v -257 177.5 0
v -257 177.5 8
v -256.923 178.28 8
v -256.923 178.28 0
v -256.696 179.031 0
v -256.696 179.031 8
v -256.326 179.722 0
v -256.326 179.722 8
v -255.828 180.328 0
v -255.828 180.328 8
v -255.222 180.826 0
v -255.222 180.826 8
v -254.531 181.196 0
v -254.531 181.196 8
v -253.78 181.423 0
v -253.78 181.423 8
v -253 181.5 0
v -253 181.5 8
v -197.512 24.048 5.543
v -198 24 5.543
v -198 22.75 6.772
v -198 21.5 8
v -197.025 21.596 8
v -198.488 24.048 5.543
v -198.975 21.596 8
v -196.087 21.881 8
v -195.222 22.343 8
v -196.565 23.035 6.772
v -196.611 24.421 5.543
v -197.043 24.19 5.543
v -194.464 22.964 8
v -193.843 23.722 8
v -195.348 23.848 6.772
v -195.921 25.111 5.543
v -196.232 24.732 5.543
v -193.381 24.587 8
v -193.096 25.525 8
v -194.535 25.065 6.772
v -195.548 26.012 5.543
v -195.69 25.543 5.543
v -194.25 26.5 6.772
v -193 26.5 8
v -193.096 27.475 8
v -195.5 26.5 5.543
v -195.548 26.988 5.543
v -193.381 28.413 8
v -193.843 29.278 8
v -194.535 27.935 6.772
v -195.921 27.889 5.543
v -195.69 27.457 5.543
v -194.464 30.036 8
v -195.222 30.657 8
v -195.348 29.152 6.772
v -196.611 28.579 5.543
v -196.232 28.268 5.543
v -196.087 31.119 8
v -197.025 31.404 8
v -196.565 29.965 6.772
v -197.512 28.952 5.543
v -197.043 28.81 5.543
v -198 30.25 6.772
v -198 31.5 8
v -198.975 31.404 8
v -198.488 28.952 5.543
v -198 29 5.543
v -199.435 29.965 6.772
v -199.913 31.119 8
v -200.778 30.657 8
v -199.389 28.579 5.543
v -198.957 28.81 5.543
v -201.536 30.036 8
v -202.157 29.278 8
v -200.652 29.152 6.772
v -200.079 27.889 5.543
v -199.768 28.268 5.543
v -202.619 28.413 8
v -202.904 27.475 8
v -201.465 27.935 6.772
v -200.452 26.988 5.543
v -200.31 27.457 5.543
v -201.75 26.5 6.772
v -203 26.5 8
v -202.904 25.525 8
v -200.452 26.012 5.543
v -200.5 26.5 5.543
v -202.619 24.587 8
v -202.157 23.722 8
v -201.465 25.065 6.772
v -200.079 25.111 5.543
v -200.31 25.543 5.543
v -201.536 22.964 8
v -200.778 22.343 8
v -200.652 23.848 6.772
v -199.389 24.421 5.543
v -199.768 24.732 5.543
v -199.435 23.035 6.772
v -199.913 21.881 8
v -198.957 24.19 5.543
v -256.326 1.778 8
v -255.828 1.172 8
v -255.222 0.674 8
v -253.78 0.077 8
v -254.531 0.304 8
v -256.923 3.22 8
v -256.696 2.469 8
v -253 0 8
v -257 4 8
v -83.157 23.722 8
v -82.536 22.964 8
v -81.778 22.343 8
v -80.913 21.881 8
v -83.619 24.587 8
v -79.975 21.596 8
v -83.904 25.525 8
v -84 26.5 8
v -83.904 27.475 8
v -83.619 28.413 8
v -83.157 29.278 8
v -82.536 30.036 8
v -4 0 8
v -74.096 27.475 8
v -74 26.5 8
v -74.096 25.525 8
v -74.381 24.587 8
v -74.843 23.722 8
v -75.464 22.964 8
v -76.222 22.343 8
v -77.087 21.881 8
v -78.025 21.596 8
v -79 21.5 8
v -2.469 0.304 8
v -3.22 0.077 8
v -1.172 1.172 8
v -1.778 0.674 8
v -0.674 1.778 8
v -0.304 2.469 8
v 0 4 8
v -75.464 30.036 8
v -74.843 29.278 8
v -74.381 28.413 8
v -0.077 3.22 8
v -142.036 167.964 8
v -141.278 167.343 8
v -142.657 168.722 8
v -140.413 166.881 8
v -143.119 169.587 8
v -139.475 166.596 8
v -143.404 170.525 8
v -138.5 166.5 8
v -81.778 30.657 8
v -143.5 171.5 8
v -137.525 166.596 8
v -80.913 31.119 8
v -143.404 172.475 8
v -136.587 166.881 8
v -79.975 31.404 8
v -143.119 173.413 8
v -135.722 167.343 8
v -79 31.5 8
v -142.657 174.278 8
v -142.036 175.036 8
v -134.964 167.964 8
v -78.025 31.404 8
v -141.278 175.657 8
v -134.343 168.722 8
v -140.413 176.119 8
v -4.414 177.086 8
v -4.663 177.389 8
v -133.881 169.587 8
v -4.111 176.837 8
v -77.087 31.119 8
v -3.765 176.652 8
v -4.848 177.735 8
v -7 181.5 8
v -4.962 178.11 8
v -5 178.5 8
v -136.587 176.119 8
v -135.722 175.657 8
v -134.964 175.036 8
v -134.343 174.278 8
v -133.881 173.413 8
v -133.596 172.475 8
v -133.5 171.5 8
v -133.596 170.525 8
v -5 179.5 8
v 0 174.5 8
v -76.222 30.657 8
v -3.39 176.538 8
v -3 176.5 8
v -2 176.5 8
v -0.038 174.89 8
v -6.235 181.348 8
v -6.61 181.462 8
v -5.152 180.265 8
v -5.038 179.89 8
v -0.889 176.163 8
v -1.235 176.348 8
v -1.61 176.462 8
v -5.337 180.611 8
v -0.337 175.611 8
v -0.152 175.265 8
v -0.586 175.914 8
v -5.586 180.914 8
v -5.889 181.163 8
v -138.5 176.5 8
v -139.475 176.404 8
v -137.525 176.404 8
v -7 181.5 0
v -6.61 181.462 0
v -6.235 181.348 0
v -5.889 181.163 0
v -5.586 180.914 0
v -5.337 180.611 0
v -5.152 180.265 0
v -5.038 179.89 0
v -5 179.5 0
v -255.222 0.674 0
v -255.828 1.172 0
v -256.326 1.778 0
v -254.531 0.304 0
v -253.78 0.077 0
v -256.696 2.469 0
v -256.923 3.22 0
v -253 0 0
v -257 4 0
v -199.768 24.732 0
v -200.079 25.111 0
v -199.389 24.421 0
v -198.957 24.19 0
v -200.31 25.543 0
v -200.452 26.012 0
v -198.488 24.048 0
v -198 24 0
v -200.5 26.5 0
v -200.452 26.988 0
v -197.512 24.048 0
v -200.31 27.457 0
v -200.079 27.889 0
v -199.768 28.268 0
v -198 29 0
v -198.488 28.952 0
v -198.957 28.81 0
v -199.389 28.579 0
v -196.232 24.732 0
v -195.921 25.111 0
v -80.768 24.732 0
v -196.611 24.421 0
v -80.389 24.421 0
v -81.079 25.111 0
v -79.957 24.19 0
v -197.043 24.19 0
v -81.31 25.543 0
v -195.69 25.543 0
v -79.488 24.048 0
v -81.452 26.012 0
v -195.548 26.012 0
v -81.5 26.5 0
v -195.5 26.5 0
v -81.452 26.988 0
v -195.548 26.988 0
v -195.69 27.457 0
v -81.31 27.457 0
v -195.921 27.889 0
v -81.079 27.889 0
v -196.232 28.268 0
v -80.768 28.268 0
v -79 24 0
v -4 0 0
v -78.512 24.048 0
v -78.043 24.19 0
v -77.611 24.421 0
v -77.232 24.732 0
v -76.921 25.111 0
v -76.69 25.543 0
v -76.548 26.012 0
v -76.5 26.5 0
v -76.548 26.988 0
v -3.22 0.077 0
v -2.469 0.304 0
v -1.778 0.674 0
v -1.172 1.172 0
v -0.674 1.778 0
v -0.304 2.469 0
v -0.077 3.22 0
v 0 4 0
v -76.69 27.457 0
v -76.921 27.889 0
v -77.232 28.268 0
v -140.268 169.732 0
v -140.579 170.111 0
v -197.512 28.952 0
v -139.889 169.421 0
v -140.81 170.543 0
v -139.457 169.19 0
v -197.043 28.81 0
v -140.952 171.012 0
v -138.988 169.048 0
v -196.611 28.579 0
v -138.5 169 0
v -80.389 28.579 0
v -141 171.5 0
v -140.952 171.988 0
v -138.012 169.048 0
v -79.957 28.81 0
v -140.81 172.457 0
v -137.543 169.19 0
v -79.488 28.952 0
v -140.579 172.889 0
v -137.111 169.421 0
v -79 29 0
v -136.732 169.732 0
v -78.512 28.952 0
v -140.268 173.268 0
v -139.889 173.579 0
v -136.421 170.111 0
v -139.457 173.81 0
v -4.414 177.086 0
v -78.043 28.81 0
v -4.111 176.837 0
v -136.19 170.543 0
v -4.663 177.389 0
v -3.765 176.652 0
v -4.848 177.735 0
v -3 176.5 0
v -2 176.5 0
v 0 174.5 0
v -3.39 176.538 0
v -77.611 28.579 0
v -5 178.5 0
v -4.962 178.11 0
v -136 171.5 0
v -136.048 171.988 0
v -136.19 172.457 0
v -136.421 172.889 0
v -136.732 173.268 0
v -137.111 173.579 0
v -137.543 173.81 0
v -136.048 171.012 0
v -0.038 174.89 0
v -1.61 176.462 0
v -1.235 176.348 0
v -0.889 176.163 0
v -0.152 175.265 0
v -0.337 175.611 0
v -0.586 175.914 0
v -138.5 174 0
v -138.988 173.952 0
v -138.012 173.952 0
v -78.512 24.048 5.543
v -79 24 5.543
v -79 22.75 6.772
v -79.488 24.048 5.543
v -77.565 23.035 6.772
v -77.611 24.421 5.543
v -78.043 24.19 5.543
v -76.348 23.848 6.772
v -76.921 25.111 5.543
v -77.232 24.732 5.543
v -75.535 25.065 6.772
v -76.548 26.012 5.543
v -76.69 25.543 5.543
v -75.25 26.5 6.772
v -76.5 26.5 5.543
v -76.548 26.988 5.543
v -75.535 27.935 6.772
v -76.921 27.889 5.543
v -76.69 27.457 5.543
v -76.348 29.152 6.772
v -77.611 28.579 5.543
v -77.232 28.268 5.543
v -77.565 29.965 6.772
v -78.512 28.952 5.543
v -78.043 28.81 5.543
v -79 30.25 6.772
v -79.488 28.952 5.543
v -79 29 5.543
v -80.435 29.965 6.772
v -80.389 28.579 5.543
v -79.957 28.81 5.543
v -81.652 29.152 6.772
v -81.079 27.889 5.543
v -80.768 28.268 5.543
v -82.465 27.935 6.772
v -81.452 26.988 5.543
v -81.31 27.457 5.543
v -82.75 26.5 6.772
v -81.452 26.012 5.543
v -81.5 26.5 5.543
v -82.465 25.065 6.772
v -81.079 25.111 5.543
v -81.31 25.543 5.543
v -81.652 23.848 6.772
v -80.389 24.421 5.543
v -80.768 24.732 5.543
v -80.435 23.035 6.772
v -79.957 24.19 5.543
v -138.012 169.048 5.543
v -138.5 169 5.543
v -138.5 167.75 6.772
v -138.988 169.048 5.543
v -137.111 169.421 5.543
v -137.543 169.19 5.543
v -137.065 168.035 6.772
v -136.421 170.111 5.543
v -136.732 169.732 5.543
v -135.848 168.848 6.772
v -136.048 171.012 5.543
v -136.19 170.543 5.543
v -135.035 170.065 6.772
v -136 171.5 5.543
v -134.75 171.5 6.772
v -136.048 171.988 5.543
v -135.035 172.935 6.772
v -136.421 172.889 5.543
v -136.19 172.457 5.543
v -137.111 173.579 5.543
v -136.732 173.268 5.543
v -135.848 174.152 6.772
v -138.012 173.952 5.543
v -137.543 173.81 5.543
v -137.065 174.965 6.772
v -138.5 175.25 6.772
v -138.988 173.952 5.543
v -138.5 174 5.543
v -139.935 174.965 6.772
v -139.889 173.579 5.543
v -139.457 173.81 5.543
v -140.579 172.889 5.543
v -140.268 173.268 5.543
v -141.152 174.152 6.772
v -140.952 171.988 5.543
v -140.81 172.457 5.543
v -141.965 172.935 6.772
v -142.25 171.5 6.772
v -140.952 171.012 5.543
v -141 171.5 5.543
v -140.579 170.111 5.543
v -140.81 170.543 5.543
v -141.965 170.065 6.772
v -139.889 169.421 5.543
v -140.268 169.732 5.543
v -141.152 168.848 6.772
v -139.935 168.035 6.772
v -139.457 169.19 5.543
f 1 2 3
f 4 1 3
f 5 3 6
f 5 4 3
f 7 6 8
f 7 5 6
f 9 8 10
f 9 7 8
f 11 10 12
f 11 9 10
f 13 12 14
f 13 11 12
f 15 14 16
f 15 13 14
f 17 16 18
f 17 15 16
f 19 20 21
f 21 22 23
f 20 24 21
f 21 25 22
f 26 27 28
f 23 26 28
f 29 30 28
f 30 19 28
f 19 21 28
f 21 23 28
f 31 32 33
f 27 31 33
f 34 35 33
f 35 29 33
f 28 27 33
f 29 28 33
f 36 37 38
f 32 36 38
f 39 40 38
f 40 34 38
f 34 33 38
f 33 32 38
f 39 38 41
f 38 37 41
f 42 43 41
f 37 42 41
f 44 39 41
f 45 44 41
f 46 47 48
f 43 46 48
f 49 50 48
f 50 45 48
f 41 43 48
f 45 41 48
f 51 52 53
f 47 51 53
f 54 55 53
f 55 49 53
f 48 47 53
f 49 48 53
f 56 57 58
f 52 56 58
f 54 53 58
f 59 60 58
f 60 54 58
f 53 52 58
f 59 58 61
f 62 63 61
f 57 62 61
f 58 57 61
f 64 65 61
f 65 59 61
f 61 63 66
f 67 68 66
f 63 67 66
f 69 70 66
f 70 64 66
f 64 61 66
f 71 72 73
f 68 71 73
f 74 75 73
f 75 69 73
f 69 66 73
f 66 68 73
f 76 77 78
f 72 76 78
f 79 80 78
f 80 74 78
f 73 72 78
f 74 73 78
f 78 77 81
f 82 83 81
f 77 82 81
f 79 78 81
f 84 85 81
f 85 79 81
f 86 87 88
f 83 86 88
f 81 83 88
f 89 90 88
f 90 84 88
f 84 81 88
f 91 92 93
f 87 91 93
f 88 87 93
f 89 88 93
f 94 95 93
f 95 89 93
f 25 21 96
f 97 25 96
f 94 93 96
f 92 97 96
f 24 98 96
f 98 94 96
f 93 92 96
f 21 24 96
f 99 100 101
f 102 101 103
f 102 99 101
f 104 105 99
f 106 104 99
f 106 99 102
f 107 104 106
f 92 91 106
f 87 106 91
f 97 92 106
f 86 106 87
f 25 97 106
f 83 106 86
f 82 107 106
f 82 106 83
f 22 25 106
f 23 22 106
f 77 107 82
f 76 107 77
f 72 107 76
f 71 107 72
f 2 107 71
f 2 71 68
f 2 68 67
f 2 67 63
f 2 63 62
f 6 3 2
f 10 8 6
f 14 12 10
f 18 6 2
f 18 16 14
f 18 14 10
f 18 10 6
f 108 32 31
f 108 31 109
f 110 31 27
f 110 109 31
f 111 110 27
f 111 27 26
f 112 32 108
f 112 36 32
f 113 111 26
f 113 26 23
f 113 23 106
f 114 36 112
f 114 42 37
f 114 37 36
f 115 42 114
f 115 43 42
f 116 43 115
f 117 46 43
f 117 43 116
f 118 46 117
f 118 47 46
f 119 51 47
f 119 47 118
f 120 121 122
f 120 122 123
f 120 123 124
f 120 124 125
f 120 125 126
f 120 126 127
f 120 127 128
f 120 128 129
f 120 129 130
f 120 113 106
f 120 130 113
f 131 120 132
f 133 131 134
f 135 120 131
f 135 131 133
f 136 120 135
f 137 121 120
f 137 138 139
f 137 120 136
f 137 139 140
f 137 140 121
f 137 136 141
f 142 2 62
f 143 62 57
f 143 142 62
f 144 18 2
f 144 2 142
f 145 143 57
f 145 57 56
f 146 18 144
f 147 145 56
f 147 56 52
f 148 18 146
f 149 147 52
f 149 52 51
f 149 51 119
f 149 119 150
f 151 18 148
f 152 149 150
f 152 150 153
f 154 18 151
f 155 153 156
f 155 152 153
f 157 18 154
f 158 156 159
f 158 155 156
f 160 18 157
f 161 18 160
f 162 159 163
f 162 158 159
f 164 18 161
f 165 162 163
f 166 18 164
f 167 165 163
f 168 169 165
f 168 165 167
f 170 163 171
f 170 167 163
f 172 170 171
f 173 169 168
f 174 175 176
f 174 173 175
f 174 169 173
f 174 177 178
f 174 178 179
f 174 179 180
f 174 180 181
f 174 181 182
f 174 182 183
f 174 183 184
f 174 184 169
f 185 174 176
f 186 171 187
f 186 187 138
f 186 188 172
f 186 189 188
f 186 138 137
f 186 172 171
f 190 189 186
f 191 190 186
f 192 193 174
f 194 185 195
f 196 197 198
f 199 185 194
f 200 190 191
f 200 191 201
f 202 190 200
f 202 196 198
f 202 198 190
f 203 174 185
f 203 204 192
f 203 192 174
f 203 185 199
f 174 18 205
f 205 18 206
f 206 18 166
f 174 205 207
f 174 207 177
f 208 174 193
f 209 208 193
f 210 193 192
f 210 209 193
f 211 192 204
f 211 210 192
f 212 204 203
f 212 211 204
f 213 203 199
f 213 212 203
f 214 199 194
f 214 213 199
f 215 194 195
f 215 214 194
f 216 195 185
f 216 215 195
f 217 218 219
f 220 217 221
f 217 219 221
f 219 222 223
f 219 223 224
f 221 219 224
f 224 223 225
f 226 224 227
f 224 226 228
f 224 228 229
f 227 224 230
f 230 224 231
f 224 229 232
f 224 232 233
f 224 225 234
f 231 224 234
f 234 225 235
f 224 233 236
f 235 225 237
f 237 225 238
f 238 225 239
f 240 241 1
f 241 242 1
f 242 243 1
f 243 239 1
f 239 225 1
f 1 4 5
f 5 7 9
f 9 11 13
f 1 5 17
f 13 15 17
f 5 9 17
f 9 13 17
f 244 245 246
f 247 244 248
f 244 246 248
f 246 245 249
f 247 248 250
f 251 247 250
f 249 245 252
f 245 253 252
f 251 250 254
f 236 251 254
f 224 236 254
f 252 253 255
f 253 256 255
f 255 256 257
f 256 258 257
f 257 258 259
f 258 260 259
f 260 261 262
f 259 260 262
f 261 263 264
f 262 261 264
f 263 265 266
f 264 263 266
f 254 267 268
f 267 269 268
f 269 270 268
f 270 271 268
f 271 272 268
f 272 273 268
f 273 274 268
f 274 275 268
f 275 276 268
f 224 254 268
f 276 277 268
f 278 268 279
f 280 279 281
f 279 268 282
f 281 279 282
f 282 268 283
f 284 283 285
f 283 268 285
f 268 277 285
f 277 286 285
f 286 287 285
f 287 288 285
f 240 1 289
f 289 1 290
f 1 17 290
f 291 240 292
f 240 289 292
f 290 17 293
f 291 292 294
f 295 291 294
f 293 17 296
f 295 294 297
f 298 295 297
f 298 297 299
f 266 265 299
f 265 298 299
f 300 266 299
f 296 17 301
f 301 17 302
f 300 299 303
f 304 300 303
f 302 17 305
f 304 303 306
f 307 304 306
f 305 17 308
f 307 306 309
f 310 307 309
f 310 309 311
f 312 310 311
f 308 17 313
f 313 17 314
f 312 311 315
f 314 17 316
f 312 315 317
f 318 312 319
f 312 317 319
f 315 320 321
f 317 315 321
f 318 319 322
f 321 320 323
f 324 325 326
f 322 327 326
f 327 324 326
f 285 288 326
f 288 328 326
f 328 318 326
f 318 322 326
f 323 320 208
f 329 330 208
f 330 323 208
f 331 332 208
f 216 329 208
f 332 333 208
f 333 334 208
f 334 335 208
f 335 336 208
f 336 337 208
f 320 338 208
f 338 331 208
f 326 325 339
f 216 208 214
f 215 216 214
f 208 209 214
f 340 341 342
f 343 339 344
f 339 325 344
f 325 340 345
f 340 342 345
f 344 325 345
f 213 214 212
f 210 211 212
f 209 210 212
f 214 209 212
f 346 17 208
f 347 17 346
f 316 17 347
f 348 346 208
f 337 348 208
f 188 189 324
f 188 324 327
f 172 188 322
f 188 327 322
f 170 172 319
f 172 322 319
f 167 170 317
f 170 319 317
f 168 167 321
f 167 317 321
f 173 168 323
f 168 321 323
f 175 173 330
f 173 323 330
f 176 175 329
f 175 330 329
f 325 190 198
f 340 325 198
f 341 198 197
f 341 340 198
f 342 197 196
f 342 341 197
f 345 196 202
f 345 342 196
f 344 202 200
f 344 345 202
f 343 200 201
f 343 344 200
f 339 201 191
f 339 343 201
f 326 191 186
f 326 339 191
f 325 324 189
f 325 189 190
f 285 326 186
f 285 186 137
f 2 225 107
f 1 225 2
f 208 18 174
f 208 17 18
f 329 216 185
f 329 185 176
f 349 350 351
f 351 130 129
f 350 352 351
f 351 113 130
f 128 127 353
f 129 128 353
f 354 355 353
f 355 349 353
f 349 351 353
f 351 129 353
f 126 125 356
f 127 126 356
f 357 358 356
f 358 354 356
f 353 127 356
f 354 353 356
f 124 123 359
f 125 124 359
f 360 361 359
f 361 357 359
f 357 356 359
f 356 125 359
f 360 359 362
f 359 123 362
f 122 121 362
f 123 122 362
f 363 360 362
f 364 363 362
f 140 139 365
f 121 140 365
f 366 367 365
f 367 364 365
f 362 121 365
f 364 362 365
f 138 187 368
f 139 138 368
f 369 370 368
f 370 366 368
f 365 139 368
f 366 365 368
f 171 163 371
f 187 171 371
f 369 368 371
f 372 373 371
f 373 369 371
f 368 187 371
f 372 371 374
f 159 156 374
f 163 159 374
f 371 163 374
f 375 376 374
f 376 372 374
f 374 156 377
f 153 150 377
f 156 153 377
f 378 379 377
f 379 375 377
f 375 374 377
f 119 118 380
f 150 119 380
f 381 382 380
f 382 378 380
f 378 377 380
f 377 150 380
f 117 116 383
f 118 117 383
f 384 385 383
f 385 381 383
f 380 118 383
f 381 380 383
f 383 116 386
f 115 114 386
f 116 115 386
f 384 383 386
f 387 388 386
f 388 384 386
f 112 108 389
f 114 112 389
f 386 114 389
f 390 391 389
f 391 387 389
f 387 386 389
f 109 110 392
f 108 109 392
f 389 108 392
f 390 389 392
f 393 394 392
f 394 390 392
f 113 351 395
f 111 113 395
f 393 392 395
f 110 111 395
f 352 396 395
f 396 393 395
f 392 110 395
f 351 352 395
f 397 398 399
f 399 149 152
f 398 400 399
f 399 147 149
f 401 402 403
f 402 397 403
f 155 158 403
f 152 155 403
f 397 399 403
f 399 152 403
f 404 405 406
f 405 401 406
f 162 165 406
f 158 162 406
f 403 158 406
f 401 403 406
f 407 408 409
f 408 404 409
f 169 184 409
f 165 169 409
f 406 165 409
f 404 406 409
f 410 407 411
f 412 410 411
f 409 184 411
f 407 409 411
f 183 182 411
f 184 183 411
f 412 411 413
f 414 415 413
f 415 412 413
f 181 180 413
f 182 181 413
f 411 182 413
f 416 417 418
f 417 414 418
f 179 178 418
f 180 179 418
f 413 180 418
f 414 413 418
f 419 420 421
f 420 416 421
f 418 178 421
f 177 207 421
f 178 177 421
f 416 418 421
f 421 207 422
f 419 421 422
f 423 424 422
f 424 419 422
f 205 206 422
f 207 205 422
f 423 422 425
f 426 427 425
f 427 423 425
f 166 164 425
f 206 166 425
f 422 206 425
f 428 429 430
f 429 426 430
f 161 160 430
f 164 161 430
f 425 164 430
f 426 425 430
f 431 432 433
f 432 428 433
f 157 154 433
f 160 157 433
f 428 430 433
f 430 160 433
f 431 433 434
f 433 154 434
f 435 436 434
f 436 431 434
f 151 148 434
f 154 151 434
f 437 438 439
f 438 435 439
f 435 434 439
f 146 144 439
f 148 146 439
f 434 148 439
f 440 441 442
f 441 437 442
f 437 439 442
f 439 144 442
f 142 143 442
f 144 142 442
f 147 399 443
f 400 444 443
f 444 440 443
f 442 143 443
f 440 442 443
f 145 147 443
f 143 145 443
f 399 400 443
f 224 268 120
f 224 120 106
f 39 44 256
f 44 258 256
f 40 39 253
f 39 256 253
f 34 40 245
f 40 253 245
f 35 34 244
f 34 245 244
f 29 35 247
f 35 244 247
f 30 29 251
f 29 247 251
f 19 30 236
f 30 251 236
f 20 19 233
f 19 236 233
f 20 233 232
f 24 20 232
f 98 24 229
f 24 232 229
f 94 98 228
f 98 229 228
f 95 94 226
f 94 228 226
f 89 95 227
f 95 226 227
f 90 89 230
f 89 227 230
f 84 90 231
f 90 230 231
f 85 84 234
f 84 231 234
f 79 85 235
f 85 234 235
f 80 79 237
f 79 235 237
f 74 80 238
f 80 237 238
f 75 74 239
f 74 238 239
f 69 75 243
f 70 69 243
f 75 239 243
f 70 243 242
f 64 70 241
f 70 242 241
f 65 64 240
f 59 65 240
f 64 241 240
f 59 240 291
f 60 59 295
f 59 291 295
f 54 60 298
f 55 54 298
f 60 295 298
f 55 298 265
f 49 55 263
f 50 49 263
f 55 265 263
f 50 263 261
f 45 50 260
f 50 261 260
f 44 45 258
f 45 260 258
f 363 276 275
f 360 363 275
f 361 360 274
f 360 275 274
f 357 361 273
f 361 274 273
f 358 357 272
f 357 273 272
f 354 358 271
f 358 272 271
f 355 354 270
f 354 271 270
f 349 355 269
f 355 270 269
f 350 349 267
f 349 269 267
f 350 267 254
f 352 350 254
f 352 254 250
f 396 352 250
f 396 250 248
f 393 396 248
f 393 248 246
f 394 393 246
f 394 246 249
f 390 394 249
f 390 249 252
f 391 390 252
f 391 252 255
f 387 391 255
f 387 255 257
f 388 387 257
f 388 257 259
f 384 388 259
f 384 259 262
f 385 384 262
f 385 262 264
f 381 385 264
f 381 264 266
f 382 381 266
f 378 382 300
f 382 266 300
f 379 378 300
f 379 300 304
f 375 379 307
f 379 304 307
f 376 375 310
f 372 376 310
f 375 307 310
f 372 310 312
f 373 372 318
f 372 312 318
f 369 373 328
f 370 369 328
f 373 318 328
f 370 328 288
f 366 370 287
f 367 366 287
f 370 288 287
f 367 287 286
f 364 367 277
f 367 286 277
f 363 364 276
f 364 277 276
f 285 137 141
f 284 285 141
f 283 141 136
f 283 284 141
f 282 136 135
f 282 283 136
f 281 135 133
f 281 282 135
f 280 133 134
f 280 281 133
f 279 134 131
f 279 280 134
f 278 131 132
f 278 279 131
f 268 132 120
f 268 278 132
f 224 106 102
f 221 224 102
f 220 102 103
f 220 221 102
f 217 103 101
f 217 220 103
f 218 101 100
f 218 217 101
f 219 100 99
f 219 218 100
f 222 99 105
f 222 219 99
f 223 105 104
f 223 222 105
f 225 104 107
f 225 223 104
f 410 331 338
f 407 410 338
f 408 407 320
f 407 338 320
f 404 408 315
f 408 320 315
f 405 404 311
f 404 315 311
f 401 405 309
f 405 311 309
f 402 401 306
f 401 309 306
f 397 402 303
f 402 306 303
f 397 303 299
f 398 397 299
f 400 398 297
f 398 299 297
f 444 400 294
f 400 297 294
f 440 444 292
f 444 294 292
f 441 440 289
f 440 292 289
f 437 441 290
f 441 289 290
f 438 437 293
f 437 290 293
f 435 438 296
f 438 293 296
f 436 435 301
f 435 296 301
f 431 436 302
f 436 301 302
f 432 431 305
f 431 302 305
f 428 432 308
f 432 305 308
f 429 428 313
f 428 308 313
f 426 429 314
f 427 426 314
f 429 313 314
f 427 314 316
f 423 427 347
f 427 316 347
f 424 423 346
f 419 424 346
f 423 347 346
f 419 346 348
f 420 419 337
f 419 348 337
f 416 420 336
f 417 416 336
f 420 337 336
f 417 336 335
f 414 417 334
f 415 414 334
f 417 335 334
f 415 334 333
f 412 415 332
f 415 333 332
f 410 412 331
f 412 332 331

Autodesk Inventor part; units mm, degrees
ref_plane "YZ Plane" through (0, 0, 0) normal (1, 0, 0) x (0, 1, 0)
ref_plane "XZ Plane" through (0, 0, 0) normal (0, 1, 0) x (-1, 0, 0)
ref_plane "XY Plane" through (0, 0, 0) normal (0, 0, 1) x (1, 0, 0)
sketch "Sketch1" plane through (0, 0, 0) normal (0, 0, 1) x (1, 0, 0)
  circle A0 centre (-79, 26.5) radius 2.5
  circle A1 centre (-198, 26.5) radius 2.5
  circle A2 centre (-138.5, 171.5) radius 2.5
  line L0 (-4, 0) -> (-253, 0)
  arc A3 (-4, 0) -> (0, 4) centre (-4, 4) ccw
  line L1 (0, 174.5) -> (0, 4)
  arc A4 (0, 174.5) -> (-2, 176.5) centre (-2, 174.5) ccw
  line L2 (-3, 176.5) -> (-2, 176.5)
  arc A5 (-5, 178.5) -> (-3, 176.5) centre (-3, 178.5) ccw
  line L3 (-5, 179.5) -> (-5, 178.5)
  arc A6 (-5, 179.5) -> (-7, 181.5) centre (-7, 179.5) ccw
  line L4 (-253, 181.5) -> (-7, 181.5)
  arc A7 (-253, 181.5) -> (-257, 177.5) centre (-253, 177.5) ccw
  line L5 (-257, 4) -> (-257, 177.5)
  arc A8 (-257, 4) -> (-253, 0) centre (-253, 4) ccw
  point P0 (0, 0)
  point P1 (0, 0)
  dimension "d2" = 119
  dimension "d4" = 145
  dimension "d5" = 59.5
  dimension "d6" = 79
  dimension "d7" = 26.5
  dimension "d8" = 10
  dimension "d9" = 59
  dimension "d10" = 5
  dimension "d11" = 5
  dimension "d12" = 5
  dimension "d13" = 4
  dimension "d14" = 2
  dimension "d15" = 2
  dimension "d16" = 4
  dimension "d17" = 4
  dimension "d18" = 5
  dimension "d19" = 5
extrude "Extrusion1" add sketch "Sketch1" along normal blind 8
sketch "Sketch3" plane through (0, 0, 8) normal (0, 0, 1) x (1, 0, 0)
  circle A0 centre (-79, 26.5) radius 2.5 projected
  circle A1 centre (-198, 26.5) radius 2.5 projected
  circle A2 centre (-138.5, 171.5) radius 2.5 projected
  point P0 (0, 0)
hole "Hole1" at (-198, 26.5, 8) at (-79, 26.5, 8) at (-138.5, 171.5, 8) direction (0, 0, -1) diameter 10 depth 0 tip angle 91
properties part number "zCarPlexiBed"
